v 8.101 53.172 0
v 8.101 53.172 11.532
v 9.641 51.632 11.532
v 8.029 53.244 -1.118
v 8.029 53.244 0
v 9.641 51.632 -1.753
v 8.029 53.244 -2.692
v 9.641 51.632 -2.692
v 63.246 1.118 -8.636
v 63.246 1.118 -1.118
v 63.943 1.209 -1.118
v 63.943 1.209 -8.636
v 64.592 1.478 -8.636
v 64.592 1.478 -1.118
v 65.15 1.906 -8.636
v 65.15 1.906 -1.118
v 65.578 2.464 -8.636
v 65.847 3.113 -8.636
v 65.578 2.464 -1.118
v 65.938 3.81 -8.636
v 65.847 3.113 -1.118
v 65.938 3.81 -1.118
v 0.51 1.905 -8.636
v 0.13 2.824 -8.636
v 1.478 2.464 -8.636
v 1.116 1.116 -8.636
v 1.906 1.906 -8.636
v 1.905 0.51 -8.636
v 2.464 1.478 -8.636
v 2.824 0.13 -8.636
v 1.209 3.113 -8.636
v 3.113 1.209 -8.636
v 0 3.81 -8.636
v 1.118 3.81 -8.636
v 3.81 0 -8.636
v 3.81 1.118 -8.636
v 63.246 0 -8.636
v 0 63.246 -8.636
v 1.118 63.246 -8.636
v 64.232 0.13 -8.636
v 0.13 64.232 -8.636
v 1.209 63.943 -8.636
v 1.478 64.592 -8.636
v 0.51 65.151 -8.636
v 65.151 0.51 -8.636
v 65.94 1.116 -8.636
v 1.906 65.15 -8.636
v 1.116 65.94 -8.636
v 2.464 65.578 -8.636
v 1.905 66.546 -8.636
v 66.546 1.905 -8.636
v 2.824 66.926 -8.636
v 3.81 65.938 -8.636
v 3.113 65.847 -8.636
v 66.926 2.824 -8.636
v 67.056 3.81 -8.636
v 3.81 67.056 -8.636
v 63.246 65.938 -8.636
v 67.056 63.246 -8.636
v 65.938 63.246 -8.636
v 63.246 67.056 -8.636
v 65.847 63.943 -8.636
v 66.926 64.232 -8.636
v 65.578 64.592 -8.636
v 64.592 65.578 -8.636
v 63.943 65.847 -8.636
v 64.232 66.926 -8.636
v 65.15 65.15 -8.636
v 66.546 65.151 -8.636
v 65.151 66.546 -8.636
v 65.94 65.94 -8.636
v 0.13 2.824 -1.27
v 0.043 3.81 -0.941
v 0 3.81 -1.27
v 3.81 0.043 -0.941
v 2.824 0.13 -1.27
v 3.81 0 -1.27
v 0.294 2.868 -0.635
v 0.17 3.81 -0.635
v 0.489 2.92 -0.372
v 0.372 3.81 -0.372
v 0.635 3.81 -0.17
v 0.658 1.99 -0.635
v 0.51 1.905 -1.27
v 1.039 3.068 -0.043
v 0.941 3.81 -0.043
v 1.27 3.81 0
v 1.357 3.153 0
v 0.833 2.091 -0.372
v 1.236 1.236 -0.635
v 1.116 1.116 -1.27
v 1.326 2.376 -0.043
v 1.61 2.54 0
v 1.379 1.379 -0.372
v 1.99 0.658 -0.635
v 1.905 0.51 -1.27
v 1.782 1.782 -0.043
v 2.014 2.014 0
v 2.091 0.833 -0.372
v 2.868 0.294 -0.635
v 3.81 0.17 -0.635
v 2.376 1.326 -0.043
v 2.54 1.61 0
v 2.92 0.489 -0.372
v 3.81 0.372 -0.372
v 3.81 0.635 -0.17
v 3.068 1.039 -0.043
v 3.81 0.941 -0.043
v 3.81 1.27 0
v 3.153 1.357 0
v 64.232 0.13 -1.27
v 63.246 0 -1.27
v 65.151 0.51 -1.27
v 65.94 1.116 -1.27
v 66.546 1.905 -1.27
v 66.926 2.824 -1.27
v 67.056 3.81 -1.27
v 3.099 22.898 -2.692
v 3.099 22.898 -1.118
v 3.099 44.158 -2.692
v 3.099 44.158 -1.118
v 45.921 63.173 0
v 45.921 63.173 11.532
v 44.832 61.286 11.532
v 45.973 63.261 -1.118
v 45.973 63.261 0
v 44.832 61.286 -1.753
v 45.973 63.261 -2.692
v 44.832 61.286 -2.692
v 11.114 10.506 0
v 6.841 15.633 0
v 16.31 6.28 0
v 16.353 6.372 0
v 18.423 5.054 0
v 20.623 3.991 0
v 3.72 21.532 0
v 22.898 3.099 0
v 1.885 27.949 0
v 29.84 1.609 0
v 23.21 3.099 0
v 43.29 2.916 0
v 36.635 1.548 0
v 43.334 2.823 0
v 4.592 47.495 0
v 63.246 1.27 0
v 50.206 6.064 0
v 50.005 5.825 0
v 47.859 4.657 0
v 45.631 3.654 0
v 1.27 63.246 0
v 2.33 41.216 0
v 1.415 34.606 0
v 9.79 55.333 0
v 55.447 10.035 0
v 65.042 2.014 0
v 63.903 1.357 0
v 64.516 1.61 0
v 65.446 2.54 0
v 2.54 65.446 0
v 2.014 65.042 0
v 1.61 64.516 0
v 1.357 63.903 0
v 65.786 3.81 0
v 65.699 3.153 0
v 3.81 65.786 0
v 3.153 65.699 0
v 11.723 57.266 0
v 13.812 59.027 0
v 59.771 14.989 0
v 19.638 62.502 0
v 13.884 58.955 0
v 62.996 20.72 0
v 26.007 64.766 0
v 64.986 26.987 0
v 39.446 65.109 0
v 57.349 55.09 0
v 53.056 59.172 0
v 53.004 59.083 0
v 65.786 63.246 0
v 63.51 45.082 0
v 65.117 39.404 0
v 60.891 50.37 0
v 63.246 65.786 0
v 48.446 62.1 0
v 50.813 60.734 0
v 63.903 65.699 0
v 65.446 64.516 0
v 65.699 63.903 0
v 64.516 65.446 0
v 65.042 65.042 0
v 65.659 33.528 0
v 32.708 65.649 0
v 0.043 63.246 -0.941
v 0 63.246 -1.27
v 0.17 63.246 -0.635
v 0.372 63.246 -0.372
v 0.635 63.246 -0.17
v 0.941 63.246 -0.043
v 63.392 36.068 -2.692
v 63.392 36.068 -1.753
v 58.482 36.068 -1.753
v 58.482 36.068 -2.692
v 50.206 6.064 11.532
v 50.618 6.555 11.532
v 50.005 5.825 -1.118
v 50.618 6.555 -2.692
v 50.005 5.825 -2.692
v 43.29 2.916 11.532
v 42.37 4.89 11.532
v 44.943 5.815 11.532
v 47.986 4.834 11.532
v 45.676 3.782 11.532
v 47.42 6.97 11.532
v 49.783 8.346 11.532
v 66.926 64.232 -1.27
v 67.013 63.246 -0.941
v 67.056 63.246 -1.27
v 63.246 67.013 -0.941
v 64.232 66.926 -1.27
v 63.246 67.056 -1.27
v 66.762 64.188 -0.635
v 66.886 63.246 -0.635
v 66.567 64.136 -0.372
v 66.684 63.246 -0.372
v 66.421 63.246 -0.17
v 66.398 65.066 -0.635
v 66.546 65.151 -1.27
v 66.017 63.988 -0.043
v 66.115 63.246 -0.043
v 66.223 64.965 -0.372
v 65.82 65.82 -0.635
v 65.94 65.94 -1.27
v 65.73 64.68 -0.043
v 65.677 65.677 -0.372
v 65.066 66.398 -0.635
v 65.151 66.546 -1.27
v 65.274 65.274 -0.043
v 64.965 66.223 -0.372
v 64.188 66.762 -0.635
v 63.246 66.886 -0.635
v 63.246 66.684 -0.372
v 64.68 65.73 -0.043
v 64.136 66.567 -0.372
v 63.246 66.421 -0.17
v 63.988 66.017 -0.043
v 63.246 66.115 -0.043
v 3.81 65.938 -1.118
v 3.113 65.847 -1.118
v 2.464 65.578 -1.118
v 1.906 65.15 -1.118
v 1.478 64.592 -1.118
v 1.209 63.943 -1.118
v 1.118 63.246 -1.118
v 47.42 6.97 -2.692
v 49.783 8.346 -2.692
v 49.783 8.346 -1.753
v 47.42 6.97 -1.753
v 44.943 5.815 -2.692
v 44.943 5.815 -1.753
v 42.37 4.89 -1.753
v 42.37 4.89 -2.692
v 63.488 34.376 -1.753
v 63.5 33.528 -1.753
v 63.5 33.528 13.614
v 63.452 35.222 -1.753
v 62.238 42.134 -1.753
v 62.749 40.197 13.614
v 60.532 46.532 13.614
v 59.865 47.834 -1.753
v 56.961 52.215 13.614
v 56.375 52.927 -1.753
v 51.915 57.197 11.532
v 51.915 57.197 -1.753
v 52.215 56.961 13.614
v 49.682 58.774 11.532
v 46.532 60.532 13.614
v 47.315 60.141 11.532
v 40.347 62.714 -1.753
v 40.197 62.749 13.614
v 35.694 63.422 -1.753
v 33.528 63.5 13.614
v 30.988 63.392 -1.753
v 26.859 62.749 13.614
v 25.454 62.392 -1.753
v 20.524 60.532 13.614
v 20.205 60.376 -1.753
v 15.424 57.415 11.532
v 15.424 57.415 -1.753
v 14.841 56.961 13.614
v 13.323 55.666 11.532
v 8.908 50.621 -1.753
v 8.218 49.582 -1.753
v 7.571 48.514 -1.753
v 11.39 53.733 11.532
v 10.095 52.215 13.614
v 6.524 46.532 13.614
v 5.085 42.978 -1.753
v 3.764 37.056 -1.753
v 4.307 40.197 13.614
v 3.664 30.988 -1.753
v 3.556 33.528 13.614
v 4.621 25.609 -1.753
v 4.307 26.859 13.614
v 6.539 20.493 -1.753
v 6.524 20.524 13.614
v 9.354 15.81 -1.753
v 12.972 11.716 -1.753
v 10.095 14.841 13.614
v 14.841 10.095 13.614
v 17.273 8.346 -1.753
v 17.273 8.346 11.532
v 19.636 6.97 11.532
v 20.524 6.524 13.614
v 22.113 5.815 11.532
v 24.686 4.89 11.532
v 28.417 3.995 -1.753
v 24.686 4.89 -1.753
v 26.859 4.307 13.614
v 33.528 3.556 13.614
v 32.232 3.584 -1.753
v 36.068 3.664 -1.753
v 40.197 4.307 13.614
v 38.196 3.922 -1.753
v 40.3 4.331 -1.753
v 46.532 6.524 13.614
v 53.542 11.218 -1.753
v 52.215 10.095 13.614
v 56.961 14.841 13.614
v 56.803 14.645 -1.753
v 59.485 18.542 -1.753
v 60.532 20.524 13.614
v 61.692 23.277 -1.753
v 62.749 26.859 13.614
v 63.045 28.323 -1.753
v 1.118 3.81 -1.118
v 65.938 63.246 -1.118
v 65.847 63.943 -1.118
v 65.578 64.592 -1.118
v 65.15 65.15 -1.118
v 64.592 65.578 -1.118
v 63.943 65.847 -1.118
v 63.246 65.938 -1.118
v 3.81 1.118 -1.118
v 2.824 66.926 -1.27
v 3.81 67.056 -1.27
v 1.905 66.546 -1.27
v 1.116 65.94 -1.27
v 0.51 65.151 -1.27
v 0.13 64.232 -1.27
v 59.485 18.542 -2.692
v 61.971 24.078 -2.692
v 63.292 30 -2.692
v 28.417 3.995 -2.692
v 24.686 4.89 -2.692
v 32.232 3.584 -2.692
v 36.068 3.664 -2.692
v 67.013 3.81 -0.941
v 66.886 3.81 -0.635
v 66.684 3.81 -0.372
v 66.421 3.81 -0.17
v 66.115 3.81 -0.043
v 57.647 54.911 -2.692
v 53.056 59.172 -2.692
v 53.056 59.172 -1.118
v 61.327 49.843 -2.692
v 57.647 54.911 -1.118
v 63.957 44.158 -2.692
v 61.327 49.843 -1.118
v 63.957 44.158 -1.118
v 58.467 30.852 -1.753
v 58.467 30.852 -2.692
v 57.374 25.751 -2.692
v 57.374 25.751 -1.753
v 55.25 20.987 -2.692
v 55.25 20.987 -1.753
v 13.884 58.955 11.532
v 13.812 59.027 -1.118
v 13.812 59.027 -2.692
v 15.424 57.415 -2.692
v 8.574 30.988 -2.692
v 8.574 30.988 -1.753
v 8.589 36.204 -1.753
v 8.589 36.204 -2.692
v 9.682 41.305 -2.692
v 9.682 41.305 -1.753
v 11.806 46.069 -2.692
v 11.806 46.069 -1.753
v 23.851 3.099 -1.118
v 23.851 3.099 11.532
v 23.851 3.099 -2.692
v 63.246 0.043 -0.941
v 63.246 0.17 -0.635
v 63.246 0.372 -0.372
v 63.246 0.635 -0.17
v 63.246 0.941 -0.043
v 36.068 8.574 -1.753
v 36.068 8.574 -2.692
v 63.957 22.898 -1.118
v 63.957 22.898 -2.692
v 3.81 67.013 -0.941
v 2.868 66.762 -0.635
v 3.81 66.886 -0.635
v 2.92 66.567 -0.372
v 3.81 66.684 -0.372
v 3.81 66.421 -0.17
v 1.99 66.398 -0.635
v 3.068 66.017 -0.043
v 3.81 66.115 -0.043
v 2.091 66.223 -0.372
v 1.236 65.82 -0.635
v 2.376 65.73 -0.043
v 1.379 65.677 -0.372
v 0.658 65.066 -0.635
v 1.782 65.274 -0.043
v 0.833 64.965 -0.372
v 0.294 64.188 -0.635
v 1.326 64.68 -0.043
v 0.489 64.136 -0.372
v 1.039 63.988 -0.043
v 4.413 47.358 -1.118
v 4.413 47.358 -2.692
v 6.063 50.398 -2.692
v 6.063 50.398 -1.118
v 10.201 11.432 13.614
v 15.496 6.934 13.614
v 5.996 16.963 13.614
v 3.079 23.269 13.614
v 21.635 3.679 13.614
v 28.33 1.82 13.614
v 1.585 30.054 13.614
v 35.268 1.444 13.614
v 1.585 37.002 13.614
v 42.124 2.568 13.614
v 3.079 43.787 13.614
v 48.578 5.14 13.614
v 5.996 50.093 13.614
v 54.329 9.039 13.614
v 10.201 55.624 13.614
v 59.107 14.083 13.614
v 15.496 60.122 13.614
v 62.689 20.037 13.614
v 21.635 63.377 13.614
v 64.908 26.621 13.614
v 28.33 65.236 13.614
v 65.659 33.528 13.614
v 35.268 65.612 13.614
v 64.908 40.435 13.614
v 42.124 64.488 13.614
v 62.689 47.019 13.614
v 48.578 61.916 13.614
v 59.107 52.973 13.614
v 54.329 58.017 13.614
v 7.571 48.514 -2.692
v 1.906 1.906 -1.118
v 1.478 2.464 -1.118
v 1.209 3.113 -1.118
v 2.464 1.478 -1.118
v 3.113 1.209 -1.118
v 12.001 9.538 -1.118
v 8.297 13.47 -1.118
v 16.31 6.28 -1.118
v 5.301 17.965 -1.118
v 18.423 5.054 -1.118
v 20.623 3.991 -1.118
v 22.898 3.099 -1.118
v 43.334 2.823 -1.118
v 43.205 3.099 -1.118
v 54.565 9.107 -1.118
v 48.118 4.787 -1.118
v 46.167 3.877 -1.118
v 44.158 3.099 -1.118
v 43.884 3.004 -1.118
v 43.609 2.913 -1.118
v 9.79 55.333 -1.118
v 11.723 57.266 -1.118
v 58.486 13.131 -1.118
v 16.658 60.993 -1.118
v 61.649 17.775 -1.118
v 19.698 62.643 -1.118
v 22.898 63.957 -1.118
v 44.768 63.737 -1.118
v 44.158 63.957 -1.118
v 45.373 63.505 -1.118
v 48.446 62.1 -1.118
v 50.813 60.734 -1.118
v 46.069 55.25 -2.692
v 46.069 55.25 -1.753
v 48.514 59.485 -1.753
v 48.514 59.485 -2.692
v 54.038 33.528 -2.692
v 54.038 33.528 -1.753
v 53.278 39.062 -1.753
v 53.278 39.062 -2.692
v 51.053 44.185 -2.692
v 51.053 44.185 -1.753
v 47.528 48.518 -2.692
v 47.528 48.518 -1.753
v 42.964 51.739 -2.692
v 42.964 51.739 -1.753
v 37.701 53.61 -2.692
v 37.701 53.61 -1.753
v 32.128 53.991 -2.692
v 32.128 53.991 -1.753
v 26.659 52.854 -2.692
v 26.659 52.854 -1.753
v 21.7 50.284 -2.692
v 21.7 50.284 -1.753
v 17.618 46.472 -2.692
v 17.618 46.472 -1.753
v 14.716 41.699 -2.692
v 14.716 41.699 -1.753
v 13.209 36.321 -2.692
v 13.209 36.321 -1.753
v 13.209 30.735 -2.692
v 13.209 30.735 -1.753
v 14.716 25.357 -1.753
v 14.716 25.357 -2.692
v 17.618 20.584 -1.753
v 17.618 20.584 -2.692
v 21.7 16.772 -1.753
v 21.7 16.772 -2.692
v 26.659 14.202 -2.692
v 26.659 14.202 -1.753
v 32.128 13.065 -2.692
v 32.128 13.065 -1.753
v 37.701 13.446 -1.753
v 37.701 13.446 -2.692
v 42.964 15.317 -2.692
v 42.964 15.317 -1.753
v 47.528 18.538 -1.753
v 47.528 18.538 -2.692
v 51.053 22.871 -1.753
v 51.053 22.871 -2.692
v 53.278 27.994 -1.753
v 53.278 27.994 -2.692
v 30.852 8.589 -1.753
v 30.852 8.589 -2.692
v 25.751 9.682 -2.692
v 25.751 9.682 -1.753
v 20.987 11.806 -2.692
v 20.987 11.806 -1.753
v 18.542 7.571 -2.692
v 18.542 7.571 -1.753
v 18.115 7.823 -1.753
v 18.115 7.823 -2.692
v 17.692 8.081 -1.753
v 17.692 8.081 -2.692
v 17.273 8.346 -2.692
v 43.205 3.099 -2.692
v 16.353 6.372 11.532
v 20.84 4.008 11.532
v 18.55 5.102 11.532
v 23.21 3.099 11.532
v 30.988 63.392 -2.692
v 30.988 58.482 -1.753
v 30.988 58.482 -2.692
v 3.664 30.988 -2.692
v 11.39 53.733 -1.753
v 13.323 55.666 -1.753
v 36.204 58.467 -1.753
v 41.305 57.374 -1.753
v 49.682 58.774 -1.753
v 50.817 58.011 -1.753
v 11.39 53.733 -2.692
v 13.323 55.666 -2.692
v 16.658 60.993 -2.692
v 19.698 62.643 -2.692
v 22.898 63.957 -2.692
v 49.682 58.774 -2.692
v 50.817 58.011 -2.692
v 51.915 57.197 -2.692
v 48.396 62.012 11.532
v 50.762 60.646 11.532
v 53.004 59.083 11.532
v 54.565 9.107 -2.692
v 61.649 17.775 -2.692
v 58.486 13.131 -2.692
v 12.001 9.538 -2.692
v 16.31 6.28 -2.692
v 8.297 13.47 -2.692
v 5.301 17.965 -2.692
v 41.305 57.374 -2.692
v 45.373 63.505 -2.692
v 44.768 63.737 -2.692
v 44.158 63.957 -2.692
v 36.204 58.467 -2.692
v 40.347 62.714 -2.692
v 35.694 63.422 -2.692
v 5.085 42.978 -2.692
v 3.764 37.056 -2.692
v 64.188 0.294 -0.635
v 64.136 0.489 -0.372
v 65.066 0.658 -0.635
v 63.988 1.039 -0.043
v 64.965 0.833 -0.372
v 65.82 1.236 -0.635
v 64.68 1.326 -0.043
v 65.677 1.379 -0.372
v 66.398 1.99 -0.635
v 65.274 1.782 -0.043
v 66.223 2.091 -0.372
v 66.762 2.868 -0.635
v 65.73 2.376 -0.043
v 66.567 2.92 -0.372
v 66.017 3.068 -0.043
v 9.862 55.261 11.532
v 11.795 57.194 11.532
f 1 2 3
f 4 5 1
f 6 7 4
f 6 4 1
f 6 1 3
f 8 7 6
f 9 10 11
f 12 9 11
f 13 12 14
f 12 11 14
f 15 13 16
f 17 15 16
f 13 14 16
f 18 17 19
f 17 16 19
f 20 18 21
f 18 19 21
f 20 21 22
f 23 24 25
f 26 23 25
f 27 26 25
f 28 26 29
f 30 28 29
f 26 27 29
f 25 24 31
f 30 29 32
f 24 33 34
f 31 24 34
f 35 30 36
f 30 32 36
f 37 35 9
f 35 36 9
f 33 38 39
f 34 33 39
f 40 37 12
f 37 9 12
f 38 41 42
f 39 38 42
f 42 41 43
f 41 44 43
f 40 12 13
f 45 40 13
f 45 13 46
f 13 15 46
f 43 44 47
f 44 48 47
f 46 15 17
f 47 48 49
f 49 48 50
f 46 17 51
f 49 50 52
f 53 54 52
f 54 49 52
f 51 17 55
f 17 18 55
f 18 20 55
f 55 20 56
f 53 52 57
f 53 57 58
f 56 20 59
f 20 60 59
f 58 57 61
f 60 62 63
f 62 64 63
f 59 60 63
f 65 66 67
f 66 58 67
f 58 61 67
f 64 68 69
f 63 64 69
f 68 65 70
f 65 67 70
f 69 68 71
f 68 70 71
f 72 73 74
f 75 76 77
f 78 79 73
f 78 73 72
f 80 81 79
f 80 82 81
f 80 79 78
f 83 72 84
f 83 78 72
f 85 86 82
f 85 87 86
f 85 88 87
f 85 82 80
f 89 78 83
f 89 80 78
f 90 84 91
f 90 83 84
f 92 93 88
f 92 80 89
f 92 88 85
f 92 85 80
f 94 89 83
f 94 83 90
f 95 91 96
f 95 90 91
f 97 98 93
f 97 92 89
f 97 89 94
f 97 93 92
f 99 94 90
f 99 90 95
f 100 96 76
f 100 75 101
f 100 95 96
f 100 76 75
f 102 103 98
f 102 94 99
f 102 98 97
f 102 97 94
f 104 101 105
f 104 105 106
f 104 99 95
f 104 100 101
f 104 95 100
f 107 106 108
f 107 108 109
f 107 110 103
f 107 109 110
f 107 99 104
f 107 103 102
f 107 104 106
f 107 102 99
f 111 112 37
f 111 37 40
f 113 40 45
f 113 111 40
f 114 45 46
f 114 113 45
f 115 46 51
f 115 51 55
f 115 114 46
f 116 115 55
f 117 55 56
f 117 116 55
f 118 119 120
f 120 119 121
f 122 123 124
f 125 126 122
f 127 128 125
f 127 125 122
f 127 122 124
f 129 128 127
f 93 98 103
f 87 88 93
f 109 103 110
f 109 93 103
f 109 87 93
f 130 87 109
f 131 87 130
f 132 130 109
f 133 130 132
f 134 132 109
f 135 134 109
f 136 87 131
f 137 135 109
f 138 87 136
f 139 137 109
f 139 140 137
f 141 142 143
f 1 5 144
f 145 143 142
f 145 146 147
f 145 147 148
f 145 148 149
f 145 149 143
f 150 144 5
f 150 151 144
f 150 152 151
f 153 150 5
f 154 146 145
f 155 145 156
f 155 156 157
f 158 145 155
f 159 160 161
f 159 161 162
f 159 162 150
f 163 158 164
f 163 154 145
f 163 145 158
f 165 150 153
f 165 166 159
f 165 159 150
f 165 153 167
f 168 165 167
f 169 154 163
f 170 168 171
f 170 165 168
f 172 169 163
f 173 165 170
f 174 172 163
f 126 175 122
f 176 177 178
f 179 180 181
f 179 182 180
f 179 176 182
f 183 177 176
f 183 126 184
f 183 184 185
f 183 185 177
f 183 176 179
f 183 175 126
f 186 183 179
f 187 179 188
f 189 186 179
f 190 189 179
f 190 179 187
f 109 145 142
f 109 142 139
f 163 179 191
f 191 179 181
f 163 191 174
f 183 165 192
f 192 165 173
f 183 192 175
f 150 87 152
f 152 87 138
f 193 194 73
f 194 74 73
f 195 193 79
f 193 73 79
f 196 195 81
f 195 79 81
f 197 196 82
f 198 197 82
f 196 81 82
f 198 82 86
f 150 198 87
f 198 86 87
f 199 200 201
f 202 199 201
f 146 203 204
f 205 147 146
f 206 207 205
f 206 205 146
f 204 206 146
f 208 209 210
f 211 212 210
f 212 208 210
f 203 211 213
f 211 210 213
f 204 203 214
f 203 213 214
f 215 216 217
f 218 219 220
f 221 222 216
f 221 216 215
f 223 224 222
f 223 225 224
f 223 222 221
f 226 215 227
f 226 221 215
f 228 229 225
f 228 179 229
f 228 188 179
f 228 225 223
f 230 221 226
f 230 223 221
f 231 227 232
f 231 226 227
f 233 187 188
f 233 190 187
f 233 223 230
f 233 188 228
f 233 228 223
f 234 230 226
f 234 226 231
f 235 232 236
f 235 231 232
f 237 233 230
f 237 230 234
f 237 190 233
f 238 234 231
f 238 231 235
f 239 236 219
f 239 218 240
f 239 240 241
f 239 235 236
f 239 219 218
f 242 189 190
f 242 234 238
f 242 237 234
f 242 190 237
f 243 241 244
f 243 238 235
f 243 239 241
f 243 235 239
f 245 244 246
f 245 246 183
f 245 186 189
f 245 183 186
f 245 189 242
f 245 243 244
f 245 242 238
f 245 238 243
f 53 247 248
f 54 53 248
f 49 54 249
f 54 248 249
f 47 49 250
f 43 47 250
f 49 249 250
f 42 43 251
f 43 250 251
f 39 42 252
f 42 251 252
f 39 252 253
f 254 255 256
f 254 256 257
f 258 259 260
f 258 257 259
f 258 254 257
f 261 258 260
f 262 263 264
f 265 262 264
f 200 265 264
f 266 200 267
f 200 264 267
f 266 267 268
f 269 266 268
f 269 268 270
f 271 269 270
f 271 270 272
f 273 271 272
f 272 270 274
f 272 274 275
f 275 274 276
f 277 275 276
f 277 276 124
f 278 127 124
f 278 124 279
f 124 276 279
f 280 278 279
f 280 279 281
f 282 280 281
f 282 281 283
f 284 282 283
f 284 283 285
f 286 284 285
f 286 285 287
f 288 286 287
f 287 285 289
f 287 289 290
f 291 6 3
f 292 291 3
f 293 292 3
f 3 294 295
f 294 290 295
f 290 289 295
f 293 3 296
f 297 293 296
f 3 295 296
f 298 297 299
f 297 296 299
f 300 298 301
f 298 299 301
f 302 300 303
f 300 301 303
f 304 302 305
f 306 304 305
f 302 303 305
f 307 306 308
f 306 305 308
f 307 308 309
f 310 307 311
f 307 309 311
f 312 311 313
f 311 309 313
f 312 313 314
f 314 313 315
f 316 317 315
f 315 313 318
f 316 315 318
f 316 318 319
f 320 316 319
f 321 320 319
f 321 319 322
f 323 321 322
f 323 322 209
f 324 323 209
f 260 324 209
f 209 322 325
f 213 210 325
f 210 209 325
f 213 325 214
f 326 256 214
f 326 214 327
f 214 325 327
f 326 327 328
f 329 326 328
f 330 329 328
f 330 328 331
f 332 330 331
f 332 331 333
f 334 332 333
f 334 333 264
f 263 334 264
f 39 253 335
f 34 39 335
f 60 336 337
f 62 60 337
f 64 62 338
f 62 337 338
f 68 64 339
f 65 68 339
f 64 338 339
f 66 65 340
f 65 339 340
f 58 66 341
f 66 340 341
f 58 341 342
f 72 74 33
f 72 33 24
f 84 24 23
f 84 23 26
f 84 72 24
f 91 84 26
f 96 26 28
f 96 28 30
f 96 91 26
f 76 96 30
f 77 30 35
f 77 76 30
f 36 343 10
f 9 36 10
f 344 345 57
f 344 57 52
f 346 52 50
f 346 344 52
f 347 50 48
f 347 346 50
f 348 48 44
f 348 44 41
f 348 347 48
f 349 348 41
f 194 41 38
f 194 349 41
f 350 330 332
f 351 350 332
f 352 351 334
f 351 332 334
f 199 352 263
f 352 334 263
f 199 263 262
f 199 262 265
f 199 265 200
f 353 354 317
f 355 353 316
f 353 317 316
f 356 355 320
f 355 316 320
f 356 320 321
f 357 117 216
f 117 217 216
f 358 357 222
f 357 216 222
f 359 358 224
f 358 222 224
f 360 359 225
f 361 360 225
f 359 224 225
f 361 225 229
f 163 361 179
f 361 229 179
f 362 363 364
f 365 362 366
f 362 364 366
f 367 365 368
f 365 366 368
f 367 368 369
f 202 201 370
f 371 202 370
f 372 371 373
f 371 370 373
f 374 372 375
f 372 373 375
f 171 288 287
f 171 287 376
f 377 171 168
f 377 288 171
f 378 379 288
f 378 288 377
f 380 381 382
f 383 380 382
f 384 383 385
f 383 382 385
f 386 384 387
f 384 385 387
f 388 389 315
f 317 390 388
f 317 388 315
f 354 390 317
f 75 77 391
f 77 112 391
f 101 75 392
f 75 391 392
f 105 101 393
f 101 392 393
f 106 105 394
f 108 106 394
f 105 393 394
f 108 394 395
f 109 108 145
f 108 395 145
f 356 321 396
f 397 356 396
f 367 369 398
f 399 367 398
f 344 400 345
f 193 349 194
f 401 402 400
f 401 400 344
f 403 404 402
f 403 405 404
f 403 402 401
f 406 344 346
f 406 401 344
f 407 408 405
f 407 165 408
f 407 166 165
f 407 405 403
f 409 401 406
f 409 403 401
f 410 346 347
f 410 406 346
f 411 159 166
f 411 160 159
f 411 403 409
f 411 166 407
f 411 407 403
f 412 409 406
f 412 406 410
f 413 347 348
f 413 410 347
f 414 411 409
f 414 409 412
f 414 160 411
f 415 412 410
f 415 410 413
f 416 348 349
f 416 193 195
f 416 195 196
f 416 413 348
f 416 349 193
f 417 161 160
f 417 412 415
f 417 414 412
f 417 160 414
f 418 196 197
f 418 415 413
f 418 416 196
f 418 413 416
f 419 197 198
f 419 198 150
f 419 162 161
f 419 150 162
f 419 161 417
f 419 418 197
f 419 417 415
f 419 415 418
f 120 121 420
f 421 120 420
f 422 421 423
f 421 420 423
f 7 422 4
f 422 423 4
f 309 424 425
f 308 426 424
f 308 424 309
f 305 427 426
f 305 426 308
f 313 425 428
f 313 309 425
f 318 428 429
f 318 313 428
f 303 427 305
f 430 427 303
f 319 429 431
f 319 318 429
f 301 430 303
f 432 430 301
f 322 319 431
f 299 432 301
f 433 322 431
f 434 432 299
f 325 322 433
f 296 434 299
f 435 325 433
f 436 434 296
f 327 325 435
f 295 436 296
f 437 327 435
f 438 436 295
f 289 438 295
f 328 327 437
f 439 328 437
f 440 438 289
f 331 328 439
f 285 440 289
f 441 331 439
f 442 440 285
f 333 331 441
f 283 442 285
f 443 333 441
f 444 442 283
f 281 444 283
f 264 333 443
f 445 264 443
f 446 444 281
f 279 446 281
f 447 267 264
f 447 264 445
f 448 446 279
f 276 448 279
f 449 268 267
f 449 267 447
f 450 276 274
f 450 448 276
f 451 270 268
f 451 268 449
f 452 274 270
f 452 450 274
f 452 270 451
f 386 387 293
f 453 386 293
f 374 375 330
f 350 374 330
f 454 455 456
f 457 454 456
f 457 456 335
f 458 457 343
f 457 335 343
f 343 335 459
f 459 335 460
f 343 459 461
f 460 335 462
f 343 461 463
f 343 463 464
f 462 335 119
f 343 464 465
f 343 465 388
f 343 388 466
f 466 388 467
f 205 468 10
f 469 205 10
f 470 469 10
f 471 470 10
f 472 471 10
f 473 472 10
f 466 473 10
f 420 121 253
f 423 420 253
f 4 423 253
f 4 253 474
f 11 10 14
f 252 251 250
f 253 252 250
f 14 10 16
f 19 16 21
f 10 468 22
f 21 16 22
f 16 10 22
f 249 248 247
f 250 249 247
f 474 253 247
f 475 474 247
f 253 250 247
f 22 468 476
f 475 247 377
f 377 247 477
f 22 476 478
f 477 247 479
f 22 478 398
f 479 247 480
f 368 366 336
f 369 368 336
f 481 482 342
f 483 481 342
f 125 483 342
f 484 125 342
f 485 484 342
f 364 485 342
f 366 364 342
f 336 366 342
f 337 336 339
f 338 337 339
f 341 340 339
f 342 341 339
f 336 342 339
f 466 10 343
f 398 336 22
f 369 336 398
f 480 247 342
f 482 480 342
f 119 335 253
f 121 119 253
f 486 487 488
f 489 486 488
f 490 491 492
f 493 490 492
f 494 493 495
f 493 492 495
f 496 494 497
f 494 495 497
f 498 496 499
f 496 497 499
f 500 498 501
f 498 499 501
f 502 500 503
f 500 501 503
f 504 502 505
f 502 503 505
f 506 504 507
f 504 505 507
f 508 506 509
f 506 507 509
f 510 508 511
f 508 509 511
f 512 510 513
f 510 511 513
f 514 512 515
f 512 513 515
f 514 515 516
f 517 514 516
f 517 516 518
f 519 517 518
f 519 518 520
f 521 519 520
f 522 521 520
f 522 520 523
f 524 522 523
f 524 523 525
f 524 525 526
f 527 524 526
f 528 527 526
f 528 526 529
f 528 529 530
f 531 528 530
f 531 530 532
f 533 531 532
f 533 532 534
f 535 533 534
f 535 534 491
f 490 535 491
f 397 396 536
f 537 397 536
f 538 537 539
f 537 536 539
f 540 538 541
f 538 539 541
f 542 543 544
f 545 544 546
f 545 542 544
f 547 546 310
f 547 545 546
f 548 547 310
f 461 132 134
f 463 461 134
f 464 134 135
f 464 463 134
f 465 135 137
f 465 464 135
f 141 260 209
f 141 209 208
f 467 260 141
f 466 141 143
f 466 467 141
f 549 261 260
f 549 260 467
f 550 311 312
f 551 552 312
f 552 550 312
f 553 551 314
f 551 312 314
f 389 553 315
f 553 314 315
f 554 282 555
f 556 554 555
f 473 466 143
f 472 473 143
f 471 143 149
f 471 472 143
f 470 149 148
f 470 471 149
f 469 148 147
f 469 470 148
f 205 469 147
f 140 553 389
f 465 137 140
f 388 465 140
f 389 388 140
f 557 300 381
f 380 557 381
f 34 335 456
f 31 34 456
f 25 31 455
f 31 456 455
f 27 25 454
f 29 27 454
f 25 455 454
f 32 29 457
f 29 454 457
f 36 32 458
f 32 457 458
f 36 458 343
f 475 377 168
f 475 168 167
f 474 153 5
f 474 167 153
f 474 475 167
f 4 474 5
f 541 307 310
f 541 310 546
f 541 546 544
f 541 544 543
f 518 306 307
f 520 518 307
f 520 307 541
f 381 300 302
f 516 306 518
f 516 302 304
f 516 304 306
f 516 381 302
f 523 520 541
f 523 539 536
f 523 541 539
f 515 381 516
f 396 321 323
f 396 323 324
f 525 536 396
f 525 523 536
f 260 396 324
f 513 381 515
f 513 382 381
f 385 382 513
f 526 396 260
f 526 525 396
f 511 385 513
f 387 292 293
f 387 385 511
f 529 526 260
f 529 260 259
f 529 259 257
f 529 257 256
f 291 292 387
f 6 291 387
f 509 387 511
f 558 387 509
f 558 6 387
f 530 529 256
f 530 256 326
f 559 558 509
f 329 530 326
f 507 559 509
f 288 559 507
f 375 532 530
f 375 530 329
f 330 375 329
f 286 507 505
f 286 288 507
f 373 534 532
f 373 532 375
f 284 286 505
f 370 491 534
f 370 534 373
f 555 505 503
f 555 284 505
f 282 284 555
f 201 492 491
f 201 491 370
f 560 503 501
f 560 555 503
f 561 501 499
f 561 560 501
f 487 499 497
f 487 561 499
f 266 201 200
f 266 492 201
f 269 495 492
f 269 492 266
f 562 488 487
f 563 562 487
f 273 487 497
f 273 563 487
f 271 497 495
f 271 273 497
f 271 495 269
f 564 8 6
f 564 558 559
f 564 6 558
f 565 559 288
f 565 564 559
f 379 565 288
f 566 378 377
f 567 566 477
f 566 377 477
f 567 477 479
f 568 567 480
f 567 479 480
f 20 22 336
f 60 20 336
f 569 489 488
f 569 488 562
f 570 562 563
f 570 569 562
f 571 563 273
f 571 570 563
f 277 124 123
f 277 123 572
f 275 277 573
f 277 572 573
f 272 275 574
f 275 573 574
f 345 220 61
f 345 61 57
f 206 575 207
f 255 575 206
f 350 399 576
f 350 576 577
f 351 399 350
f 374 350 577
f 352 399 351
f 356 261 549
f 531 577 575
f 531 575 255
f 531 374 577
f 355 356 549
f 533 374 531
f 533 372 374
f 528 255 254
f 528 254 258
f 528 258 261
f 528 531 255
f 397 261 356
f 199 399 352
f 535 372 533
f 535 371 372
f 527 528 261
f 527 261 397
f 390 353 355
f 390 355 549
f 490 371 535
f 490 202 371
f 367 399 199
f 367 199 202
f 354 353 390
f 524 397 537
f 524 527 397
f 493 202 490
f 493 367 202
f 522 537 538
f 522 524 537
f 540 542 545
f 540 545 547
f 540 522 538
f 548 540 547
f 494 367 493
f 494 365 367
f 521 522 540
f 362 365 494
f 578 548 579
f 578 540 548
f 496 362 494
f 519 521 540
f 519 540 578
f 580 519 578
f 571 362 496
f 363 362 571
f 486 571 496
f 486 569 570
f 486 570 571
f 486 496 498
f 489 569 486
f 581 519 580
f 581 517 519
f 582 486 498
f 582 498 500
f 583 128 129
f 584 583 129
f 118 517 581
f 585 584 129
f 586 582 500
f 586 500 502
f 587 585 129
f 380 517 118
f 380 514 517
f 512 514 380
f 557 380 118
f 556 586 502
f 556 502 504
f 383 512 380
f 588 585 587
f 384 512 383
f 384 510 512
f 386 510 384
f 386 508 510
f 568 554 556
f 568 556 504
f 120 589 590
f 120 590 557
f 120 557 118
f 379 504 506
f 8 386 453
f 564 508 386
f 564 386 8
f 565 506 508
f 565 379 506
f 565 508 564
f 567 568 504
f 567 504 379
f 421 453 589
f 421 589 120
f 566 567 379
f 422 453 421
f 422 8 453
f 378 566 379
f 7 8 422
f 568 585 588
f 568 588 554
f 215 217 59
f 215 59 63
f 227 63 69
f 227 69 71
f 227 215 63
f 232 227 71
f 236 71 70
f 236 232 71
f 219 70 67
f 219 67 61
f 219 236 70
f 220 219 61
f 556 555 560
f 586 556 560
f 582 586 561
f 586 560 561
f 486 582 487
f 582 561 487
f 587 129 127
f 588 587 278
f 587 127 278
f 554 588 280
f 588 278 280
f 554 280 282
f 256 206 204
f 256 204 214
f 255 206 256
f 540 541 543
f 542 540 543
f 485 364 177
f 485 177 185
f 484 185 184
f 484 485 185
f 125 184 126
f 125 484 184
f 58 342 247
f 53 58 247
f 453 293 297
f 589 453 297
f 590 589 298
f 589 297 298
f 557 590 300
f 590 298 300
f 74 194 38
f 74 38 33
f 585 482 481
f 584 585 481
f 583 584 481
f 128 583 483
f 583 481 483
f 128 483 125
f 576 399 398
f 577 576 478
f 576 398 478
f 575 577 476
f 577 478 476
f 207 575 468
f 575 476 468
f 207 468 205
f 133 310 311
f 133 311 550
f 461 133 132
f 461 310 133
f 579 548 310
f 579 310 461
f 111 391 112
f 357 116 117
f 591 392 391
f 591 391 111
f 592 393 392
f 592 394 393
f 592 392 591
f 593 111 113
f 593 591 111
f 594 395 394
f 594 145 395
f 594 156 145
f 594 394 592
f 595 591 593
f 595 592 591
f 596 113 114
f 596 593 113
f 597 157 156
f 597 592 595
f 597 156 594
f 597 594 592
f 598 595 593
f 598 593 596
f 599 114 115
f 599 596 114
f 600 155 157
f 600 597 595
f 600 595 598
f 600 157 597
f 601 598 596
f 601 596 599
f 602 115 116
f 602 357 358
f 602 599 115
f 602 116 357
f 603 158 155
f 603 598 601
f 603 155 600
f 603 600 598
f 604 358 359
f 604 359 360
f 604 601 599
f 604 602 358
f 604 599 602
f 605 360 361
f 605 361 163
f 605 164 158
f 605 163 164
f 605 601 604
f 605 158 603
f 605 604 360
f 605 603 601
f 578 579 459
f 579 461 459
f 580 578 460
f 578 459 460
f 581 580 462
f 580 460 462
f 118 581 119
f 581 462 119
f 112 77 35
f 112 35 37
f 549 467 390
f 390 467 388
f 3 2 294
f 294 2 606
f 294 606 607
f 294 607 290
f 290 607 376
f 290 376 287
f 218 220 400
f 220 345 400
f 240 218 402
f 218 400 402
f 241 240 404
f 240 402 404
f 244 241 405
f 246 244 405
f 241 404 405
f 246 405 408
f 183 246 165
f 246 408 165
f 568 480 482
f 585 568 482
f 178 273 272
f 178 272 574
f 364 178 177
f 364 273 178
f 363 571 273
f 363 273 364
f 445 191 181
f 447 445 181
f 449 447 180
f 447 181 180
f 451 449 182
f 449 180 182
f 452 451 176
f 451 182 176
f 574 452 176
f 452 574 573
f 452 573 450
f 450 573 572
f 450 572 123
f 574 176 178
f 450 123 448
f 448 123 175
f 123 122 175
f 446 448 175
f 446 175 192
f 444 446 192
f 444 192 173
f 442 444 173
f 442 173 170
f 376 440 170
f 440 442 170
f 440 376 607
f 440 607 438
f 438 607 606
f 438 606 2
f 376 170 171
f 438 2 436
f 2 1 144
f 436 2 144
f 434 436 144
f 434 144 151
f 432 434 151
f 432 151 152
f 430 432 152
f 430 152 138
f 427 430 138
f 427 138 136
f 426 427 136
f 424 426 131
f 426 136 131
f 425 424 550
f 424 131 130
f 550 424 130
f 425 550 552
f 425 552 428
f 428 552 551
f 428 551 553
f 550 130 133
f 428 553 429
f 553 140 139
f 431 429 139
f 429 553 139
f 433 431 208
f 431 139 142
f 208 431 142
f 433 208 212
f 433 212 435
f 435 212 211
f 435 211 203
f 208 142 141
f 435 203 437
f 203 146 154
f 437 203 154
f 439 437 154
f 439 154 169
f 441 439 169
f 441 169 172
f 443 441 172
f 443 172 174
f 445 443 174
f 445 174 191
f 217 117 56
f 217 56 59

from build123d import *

# Parameters (mm, degrees)
BASE_EXTRUDE_DEPTH  = 8.636
SHELL1_T            = -1.1176
SKETCH2_R           = 32.131
BOSS_EXTRUDE1_DEPTH = 13.6144
SKETCH3_R           = 32.2326
BOSS_EXTRUDE2_DEPTH = 1.5748
CUT_EXTRUDE2_START  = -1.5748
CUT_EXTRUDE2_DEPTH  = 1.5748
SKETCH5_R           = 29.972
CUT_EXTRUDE3_DEPTH  = 15.367
SKETCH6_R           = 20.5105
CUT_EXTRUDE4_DEPTH  = 7.8834
CUT_EXTRUDE5_DEPTH  = 7.8834
CIRPATTERN1_COUNT   = 4
CUT_EXTRUDE6_DEPTH  = 14.224
CUT_EXTRUDE7_DEPTH  = 14.224
CUT_EXTRUDE8_DEPTH  = 14.224
CIRPATTERN2_COUNT   = 2
CIRPATTERN2_ANGLE   = 310
FILLET1_R           = 1.27


with BuildPart() as part:
    # Sketch1 → Base-Extrude (new body)
    with BuildSketch(Plane.XY):
        with BuildLine():
            Line((3.81, 0), (63.246, 0))
            ThreePointArc((63.246, 0), (65.940076836, 1.115923164), (67.056, 3.81))
            Line((67.056, 3.81), (67.056, 63.246))
            ThreePointArc((67.056, 63.246), (65.940076836, 65.940076836), (63.246, 67.056))
            Line((63.246, 67.056), (3.81, 67.056))
            ThreePointArc((3.81, 67.056), (1.115923164, 65.940076836), (0, 63.246))
            Line((0, 63.246), (0, 3.81))
            ThreePointArc((0, 3.81), (1.115923164, 1.115923164), (3.81, 0))
        make_face()
    extrude(amount=-BASE_EXTRUDE_DEPTH)

    # Shell1
    shell1_openings = [part.faces().sort_by_distance(p)[0] for p in [
        (33.528, 33.528, -8.636),
    ]]
    offset(amount=SHELL1_T, openings=shell1_openings, kind=Kind.INTERSECTION)

    # Sketch2 → Boss-Extrude1 (add)
    with BuildSketch(Plane.XY):
        with Locations((33.528, 33.528)):
            Circle(SKETCH2_R)
    extrude(amount=BOSS_EXTRUDE1_DEPTH)

    # Sketch3 → Boss-Extrude2 (add)
    with BuildSketch(Plane(origin=(0, 0, -1.1176), x_dir=(-1, 0, 0), z_dir=(0, 0, -1))):
        with Locations((-33.528, 33.528)):
            Circle(SKETCH3_R)
    extrude(amount=BOSS_EXTRUDE2_DEPTH)

    # Sketch4 → Cut-Extrude2 (cut)
    with BuildSketch(Plane(origin=(0, 0, -2.6924), x_dir=(-1, 0, 0), z_dir=(0, 0, -1)).offset(CUT_EXTRUDE2_START)):
        with BuildLine():
            Line((-63.246, 65.9384), (-3.81, 65.9384))
            ThreePointArc((-3.81, 65.9384), (-1.906185702, 65.149814298), (-1.1176, 63.246))
            Line((-1.1176, 63.246), (-1.1176, 3.81))
            ThreePointArc((-1.1176, 3.81), (-1.906185702, 1.906185702), (-3.81, 1.1176))
            Line((-3.81, 1.1176), (-63.246, 1.1176))
            ThreePointArc((-63.246, 1.1176), (-65.149814298, 1.906185702), (-65.9384, 3.81))
            Line((-65.9384, 3.81), (-65.9384, 63.246))
            ThreePointArc((-65.9384, 63.246), (-65.149814298, 65.149814298), (-63.246, 65.9384))
        make_face()
        with BuildLine():
            Line((-3.81, 63.9572), (-63.246, 63.9572))
            ThreePointArc((-63.246, 63.9572), (-63.748894343, 63.748894343), (-63.9572, 63.246))
            Line((-63.9572, 63.246), (-63.9572, 3.81))
            ThreePointArc((-63.9572, 3.81), (-63.748894343, 3.307105657), (-63.246, 3.0988))
            Line((-63.246, 3.0988), (-3.81, 3.0988))
            ThreePointArc((-3.81, 3.0988), (-3.307105657, 3.307105657), (-3.0988, 3.81))
            Line((-3.0988, 3.81), (-3.0988, 63.246))
            ThreePointArc((-3.0988, 63.246), (-3.307105657, 63.748894343), (-3.81, 63.9572))
        make_face(mode=Mode.SUBTRACT)
    extrude(amount=CUT_EXTRUDE2_DEPTH, mode=Mode.SUBTRACT)

    # Sketch5 → Cut-Extrude3 (cut)
    with BuildSketch(Plane.XY.offset(13.6144)):
        with Locations((33.528, 33.528)):
            Circle(SKETCH5_R)
    extrude(amount=-CUT_EXTRUDE3_DEPTH, mode=Mode.SUBTRACT)

    # Sketch6 → Cut-Extrude4 (cut, through all)
    with BuildSketch(Plane.XY.offset(-1.7526)):
        with Locations((33.528, 33.528)):
            Circle(SKETCH6_R)
    extrude(amount=-CUT_EXTRUDE4_DEPTH, mode=Mode.SUBTRACT)

    # Sketch7 → Cut-Extrude5 (cut, through all)
    with BuildSketch(Plane.XY.offset(-1.7526)):
        with BuildLine():
            Line((30.988, 63.392178944), (30.988, 58.481560993))
            ThreePointArc((30.988, 58.481560993), (38.783174993, 58.053801558), (46.06925, 55.25008219))
            Line((46.06925, 55.25008219), (48.514, 59.484513402))
            ThreePointArc((48.514, 59.484513402), (40.050514201, 62.781676564), (30.988, 63.392178944))
        make_face()
    cut_extrude5 = extrude(amount=-CUT_EXTRUDE5_DEPTH, mode=Mode.SUBTRACT)

    # CirPattern1: Cut-Extrude5 ×4 about axis
    cirpattern1_axis = Axis((33.528, 33.528, 0), (0, 0, 1))
    for i in range(1, CIRPATTERN1_COUNT):
        add(cut_extrude5.rotate(cirpattern1_axis, i * 360 / CIRPATTERN1_COUNT), mode=Mode.SUBTRACT)

    # Sketch8 → Cut-Extrude6 (cut)
    with BuildSketch(Plane(origin=(0, 0, -2.6924), x_dir=(-1, 0, 0), z_dir=(0, 0, -1))):
        with BuildLine():
            Line((-45.972542384, 63.261379687), (-44.832330284, 61.286474397))
            ThreePointArc((-44.832330284, 61.286474397), (-48.514, 59.484513402), (-51.915378856, 57.197074397))
            Line((-51.915378856, 57.197074397), (-53.055590957, 59.171979687))
            ThreePointArc((-53.055590957, 59.171979687), (-49.6443, 61.44225043), (-45.972542384, 63.261379687))
        make_face()
    extrude(amount=-CUT_EXTRUDE6_DEPTH, mode=Mode.SUBTRACT)

    # Sketch9 → Cut-Extrude7 (cut)
    with BuildSketch(Plane(origin=(0, 0, -2.6924), x_dir=(-1, 0, 0), z_dir=(0, 0, -1))):
        with BuildLine():
            Line((-8.028645234, 53.244069824), (-9.641148651, 51.631566407))
            ThreePointArc((-9.641148651, 51.631566407), (-12.334595554, 54.721404446), (-15.424433593, 57.414851349))
            Line((-15.424433593, 57.414851349), (-13.811930176, 59.027354766))
            ThreePointArc((-13.811930176, 59.027354766), (-10.736109965, 56.319890035), (-8.028645234, 53.244069824))
        make_face()
    extrude(amount=-CUT_EXTRUDE7_DEPTH, mode=Mode.SUBTRACT)

    # Sketch10 → Cut-Extrude8 (cut)
    with BuildSketch(Plane(origin=(0, 0, -2.6924), x_dir=(-1, 0, 0), z_dir=(0, 0, -1))):
        with BuildLine():
            Line((-17.273486431, 8.346427916), (-16.309737519, 6.279661704))
            ThreePointArc((-16.309737519, 6.279661704), (-19.513159966, 4.501722912), (-22.897652399, 3.0988))
            Line((-22.897652399, 3.0988), (-23.85078467, 3.0988))
            Line((-23.85078467, 3.0988), (-24.68599656, 4.889917677))
            ThreePointArc((-24.68599656, 4.889917677), (-20.861285459, 6.364143007), (-17.273486431, 8.346427916))
        make_face()
    cut_extrude8 = extrude(amount=-CUT_EXTRUDE8_DEPTH, mode=Mode.SUBTRACT)

    # CirPattern2: Cut-Extrude8 ×2 about axis
    cirpattern2_axis = Axis((33.528, 33.528, 0), (0, 0, -1))
    for i in range(1, CIRPATTERN2_COUNT):
        add(cut_extrude8.rotate(cirpattern2_axis, i * CIRPATTERN2_ANGLE / (CIRPATTERN2_COUNT - 1)), mode=Mode.SUBTRACT)

    # Fillet1
    fillet1_edges = [part.edges().sort_by_distance(p)[0] for p in [
        (33.528, 0, 0),
        (1.115923164, 1.115923164, 0),
        (0, 33.528, 0),
        (1.115923164, 65.940076836, 0),
        (33.528, 67.056, 0),
        (65.940076836, 65.940076836, 0),
        (67.056, 33.528, 0),
        (65.940076836, 1.115923164, 0),
    ]]
    fillet(fillet1_edges, radius=FILLET1_R)


solid = part.part
